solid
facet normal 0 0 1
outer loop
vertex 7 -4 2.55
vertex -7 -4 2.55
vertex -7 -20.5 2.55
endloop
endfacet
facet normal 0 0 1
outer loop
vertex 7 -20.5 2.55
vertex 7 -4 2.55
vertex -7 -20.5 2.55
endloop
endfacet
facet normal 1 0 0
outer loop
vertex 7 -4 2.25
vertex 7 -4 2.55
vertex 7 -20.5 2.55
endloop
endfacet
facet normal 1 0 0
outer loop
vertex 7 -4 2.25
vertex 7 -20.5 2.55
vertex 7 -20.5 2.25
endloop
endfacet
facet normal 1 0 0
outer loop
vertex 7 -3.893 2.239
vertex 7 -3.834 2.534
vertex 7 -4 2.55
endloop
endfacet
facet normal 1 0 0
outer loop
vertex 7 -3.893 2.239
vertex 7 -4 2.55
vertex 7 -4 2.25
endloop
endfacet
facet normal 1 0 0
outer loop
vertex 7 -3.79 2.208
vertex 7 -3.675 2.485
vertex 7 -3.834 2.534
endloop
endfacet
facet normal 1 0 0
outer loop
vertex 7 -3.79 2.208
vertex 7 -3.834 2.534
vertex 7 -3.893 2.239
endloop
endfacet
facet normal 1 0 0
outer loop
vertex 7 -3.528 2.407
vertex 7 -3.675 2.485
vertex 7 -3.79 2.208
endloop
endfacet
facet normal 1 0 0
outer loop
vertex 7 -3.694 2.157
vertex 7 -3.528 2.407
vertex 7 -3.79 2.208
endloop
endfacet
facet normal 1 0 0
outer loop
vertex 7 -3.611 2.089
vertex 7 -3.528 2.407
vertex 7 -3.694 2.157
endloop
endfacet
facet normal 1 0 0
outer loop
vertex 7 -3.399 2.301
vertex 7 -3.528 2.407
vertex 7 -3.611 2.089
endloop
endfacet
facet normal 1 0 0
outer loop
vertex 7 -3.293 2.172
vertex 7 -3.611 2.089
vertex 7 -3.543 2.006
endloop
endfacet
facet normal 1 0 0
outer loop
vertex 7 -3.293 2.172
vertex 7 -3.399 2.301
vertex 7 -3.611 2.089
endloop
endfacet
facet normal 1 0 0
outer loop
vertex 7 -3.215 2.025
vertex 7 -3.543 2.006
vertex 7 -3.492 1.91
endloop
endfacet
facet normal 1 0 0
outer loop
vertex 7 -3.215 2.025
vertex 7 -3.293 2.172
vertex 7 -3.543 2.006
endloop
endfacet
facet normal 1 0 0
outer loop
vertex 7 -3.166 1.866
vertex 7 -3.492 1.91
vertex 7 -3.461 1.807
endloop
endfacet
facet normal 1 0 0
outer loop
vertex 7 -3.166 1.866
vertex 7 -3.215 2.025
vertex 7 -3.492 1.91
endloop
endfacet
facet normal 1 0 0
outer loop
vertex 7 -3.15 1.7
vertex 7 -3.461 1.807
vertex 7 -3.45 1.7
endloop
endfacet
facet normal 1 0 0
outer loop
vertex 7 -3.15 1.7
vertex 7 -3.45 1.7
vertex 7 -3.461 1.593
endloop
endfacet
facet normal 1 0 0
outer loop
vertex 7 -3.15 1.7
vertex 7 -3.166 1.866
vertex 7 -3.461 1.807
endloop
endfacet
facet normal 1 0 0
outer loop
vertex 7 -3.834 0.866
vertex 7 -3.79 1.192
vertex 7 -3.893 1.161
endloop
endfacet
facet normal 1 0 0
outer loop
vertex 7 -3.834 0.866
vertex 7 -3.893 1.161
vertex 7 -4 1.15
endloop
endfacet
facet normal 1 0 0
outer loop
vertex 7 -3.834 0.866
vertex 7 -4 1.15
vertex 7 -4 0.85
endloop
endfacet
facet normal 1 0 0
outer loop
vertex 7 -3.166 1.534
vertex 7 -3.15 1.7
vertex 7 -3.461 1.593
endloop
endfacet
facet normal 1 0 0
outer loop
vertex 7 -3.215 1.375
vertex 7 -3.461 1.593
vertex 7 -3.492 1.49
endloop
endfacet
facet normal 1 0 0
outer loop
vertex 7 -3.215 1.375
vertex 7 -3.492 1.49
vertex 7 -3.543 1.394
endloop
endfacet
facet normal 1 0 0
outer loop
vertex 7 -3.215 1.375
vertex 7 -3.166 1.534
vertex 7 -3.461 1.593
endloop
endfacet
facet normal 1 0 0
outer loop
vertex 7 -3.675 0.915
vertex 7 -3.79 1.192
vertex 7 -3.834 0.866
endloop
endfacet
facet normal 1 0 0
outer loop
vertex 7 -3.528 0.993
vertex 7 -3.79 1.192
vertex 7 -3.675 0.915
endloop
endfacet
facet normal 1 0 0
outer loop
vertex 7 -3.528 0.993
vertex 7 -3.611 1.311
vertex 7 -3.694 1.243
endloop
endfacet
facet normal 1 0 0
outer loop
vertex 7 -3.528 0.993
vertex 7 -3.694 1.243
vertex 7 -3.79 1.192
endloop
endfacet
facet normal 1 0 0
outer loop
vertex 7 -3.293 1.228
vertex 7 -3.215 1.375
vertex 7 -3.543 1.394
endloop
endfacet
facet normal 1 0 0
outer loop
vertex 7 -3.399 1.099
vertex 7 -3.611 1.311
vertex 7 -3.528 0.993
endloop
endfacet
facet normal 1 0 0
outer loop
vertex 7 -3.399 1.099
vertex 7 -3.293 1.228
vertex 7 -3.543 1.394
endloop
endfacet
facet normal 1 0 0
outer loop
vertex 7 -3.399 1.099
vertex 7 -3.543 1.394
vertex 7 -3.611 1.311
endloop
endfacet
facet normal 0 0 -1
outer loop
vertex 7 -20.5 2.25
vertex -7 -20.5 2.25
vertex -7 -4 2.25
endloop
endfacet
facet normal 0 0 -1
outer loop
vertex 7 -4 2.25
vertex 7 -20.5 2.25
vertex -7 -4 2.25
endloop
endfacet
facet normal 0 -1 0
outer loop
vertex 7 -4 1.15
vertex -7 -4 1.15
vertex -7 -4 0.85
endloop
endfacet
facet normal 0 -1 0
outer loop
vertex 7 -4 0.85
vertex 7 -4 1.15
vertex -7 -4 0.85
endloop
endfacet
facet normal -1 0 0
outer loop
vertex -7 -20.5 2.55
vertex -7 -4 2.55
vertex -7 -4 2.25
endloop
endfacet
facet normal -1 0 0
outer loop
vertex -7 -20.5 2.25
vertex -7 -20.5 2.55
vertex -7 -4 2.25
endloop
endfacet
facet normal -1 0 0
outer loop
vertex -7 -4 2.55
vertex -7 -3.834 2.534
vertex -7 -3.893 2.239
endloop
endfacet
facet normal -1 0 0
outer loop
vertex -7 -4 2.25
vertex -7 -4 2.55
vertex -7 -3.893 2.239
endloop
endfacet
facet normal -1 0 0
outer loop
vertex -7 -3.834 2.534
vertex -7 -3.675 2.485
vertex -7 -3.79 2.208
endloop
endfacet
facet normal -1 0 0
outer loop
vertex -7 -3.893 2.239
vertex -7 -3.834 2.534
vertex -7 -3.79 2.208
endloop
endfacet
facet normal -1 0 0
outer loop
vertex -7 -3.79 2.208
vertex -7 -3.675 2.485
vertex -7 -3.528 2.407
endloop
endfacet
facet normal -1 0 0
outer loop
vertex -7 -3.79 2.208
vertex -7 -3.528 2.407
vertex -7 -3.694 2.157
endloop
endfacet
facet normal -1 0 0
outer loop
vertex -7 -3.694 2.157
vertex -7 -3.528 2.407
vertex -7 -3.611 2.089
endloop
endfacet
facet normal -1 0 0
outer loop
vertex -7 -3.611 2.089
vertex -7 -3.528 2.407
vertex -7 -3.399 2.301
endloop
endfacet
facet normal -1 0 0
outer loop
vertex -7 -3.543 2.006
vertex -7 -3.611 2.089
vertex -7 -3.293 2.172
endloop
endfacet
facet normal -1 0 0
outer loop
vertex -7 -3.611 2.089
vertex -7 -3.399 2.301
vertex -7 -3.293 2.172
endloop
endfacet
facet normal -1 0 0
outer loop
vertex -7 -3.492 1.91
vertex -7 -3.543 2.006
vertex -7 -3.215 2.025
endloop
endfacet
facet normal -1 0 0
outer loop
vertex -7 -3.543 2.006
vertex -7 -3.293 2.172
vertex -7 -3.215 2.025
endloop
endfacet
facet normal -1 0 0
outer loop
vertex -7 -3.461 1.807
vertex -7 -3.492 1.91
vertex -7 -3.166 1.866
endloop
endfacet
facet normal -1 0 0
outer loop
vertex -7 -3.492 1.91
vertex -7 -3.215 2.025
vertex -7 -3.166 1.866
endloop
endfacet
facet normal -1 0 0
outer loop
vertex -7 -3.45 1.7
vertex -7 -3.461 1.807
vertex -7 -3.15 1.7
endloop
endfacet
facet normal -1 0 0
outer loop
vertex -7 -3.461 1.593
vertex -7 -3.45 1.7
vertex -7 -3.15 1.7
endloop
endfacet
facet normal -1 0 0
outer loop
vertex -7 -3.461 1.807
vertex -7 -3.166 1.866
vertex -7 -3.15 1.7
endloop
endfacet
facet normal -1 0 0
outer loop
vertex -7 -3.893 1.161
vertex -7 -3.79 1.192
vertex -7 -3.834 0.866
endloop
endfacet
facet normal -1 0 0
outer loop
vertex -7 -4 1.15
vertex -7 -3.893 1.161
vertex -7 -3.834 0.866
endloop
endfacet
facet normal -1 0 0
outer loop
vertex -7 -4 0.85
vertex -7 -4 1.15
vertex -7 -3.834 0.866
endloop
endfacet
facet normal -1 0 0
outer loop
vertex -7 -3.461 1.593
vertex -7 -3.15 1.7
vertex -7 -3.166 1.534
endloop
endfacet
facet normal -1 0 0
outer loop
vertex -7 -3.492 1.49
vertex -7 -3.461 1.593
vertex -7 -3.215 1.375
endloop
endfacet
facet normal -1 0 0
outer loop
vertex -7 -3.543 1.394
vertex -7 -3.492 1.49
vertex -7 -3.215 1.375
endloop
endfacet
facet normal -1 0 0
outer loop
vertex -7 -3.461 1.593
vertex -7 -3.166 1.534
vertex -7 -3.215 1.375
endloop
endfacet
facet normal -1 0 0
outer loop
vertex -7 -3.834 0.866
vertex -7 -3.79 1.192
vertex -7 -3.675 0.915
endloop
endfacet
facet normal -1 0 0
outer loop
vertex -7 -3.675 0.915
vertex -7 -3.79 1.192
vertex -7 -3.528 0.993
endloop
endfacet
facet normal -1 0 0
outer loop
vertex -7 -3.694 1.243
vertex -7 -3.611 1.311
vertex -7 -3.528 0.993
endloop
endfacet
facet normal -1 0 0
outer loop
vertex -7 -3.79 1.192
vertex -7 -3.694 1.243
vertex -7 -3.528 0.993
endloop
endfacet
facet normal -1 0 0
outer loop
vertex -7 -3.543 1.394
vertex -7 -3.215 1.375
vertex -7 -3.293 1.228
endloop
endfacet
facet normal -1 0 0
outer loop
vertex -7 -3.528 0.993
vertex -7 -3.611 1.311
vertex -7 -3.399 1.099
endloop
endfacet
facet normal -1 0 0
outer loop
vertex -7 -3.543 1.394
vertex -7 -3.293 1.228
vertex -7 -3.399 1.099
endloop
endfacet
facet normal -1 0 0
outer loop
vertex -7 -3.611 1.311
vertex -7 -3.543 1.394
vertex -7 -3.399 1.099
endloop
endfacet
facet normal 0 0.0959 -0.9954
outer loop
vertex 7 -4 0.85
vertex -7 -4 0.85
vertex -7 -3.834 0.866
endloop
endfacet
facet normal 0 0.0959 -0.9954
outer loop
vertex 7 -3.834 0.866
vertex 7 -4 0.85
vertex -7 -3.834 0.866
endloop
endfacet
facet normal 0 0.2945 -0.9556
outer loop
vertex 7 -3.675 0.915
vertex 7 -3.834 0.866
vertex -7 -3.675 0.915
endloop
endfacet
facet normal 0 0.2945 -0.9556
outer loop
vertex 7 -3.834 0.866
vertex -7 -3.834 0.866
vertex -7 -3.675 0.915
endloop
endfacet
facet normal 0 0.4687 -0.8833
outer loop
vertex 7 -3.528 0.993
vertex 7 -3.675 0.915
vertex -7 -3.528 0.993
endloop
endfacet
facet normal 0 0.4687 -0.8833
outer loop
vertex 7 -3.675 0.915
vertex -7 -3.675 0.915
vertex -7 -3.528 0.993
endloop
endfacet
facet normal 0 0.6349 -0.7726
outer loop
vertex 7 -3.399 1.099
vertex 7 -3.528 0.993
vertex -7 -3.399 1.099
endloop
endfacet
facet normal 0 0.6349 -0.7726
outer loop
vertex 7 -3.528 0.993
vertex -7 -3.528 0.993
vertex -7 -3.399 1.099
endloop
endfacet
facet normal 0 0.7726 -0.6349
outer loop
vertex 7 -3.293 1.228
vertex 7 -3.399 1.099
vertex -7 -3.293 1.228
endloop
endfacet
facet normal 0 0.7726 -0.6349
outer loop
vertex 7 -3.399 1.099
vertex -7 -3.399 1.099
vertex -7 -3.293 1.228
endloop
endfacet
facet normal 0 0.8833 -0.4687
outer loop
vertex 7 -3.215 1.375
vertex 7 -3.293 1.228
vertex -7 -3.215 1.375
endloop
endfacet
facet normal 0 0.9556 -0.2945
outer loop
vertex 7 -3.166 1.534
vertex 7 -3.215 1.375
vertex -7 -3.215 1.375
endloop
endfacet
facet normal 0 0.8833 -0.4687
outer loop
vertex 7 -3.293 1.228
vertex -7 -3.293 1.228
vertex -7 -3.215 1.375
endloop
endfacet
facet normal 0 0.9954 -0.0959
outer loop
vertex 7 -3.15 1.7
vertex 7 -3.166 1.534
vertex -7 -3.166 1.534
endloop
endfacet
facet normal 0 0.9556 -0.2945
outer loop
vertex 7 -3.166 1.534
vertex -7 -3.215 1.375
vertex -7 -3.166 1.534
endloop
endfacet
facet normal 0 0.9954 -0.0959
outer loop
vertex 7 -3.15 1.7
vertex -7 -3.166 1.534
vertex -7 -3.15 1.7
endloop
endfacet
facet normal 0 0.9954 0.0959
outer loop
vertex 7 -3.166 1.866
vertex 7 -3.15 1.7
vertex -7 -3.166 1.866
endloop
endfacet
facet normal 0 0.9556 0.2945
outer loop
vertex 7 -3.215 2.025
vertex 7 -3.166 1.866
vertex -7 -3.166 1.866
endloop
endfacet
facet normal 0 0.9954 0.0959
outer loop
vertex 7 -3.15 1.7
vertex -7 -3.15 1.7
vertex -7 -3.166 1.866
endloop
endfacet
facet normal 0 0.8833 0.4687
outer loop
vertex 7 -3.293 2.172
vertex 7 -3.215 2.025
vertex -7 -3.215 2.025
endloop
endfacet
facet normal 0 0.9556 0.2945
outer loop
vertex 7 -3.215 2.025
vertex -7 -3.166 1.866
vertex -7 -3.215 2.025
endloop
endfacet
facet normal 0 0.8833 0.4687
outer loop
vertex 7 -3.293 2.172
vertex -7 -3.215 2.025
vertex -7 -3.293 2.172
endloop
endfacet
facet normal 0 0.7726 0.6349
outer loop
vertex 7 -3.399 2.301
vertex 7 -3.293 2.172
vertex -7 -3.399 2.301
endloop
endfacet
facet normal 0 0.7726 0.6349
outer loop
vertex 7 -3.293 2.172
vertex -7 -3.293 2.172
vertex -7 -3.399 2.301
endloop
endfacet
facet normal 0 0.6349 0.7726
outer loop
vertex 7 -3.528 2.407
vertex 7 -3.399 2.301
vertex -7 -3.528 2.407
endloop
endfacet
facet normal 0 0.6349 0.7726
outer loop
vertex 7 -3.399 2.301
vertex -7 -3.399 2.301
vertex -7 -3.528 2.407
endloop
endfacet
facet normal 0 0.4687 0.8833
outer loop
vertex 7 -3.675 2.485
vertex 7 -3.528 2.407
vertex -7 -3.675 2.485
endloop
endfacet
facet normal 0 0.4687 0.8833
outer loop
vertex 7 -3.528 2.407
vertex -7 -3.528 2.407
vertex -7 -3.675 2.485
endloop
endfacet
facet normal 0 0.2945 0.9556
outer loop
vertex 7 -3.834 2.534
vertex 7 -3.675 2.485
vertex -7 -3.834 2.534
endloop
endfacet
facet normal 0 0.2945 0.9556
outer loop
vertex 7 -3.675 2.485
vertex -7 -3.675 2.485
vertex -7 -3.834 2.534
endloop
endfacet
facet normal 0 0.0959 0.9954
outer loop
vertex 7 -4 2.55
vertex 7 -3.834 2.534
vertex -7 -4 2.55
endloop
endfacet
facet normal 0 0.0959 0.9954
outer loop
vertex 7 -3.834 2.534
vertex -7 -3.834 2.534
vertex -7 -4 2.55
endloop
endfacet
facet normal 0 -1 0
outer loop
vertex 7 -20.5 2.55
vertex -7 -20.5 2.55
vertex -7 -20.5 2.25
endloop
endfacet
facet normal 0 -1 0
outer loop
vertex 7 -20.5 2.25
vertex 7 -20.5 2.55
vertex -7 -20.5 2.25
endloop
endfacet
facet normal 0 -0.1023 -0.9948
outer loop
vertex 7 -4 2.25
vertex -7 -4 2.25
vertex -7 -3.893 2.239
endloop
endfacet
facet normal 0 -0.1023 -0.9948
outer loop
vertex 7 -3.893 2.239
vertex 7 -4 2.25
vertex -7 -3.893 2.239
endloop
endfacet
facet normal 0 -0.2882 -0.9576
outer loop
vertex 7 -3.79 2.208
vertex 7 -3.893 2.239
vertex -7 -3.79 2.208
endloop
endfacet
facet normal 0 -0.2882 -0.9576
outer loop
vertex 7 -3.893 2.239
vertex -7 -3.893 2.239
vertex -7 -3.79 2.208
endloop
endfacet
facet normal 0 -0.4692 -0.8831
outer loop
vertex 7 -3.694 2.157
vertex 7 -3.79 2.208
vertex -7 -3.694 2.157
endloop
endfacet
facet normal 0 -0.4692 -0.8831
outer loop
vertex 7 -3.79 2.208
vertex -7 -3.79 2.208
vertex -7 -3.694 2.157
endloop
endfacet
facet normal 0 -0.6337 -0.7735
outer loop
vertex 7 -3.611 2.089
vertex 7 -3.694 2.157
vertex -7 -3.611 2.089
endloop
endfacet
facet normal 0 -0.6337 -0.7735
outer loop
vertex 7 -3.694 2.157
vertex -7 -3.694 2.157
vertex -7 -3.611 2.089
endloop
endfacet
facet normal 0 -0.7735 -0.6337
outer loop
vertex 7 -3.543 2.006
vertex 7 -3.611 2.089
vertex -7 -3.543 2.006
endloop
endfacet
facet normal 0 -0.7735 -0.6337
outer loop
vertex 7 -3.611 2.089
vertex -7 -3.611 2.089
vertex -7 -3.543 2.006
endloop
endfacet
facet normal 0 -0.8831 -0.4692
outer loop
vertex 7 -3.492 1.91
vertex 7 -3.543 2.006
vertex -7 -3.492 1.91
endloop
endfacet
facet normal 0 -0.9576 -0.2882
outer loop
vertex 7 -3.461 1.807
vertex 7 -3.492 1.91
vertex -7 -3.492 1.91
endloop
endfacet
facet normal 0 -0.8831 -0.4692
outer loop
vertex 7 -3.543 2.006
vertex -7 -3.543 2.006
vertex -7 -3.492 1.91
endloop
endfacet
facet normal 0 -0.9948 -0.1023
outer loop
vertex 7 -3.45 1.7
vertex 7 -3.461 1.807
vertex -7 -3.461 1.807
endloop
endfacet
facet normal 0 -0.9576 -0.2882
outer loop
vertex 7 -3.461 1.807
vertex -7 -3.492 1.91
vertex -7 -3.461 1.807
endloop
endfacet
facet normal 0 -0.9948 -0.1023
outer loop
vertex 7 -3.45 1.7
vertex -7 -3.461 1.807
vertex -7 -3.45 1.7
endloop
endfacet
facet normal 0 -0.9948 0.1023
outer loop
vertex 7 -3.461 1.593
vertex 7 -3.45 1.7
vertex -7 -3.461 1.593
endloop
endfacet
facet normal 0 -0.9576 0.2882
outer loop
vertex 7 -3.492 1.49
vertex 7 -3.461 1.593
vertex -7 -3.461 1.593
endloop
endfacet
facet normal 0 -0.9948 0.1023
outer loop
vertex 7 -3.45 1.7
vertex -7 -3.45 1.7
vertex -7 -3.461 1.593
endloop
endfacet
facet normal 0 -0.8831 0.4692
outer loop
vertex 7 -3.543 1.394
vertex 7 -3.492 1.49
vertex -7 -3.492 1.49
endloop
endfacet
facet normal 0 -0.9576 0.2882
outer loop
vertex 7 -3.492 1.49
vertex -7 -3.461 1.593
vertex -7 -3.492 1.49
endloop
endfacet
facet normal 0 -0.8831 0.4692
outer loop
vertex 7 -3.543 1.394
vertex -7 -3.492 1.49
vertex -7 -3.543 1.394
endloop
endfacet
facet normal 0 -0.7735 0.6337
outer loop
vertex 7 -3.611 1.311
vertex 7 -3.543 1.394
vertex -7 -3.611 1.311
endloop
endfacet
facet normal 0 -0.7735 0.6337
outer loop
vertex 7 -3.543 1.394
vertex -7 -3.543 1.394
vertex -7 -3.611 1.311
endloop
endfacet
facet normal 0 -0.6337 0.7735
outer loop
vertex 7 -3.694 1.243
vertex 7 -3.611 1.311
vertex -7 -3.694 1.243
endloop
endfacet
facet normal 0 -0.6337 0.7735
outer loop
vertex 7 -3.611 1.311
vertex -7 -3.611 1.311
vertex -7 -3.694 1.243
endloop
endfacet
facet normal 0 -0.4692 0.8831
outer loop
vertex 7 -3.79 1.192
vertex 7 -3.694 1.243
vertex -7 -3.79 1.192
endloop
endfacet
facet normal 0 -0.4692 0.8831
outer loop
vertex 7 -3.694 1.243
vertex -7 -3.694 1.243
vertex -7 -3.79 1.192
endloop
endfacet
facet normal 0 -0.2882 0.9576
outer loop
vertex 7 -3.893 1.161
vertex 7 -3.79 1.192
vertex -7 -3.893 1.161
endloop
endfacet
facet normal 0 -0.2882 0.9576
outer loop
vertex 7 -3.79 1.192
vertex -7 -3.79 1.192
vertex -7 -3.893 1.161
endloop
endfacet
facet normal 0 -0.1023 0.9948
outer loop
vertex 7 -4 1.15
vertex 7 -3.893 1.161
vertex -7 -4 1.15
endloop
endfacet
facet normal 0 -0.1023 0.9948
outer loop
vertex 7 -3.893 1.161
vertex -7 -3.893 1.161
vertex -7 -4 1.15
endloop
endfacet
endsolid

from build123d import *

# Parameters (mm, degrees)
EXTRUDE_1_DEPTH      = 7
EXTRUDE_1_DEPTH_BACK = 7


with BuildPart() as part:
    # 草圖1 → 填料-伸長1 (new, two sides: drawn at the far end of the back side and taken through both)
    with BuildSketch(Plane(origin=(0, 0, 0), x_dir=(0, 0, -1), z_dir=(1, 0, 0)).offset(-EXTRUDE_1_DEPTH_BACK)):
        with BuildLine():
            Line((-2.55, -4), (-2.55, -20.5))
            Line((-2.55, -20.5), (-2.25, -20.5))
            Line((-2.25, -20.5), (-2.25, -4))
            ThreePointArc((-2.25, -4), (-1.7, -3.45), (-1.15, -4))
            Line((-1.15, -4), (-0.85, -4))
            ThreePointArc((-0.85, -4), (-1.7, -3.15), (-2.55, -4))
        make_face()
    extrude(amount=EXTRUDE_1_DEPTH + EXTRUDE_1_DEPTH_BACK)


solid = part.part
